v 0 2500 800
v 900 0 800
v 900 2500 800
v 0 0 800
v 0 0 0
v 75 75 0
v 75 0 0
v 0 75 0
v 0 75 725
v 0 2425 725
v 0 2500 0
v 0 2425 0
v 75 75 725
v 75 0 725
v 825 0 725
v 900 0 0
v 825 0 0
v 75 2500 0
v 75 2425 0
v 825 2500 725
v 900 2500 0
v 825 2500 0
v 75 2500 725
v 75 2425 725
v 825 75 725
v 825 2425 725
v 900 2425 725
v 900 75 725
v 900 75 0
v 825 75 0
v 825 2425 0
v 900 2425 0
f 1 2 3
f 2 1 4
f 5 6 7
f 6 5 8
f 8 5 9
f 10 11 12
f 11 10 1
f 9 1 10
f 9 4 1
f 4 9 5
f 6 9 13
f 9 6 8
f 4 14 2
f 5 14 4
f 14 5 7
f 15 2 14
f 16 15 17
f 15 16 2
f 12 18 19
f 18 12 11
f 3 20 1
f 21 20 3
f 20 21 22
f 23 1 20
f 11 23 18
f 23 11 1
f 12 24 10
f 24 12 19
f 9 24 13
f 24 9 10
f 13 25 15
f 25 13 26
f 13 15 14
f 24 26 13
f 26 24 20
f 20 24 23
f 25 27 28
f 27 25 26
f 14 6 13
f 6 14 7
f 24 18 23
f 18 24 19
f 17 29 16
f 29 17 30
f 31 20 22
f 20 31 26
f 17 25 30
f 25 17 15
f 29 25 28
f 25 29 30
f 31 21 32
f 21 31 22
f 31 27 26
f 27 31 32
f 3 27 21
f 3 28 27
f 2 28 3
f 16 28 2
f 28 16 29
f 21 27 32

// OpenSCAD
a_h = 2500;
a_sz = 900;
a_m = 800; 
v = 25;
sz = 75;

l_v = 75; //láb vastagság. Irányadó érték. Egész számú lécből rakja össze, ezért felfele kerekít
elso_lap_teljes = true;


asztal(retegek);//, rf = [2,1.1,1.1]);
//lab();
module asztal_elemekbol(){
    translate([0,0, a_m - sz])lap();
    translate([0,0,1])lab();
    translate([a_sz-l_v,0,0])lab();
    translate([a_sz-l_v,a_h-l_v,0])lab();
    translate([0,a_h-l_v,0])lab();
}

module lab(){
    l_m = a_m;
    n = ceil(l_v/v);
    
    for(l = [0:2:n-1]){
        translate([l*v,0,0])cube([v-1,sz, l_m]);
    }
    
    for(l = [1:2:n-1]){
        translate([l*v,0,0])cube([v-1,sz, l_m-sz]);
    }
}

module lap(){
    n = ceil(a_sz/v);
    
    for(l = [0:n-1]){
        translate([l*v,0,0])cube([v-1, a_h, sz]);
    }
}

c1_r = 230/255;
c1_g = 173/255;
c1_b = 87/255;
c2 = [c1_r, c1_g, c1_b];

c2_r = 233/255;
c2_g = 225/255;
c2_b = 212/255;

c1 = [c2_r, c2_g, c2_b];

retegek = [[a_m, 25, 0, c2],
           [a_m - sz, 25, 25, c2],
           [a_m, 25, 50, c2],
           [0, 25, 75, c1],
           [0, 25, 100, c1],
           [0, 25, 125, c1],
           [0, 25, 150, c1],
           [0, 25, 175, c1],
           [0, 25, 200, c1],
           [0, 25, 225, c1],
           [0, 25, 250, c1],
           [0, 25, 275, c1],
           [0, 25, 300, c1],
           [0, 25, 325, c1],
           [0, 25, 350, c1],
           [0, 25, 375, c2],
           [0, 25, 400, c2],
           [0, 25, 425, c2],
           [0, 25, 450, c2],
           [0, 25, 475, c2],
           [0, 25, 500, c2],
           [0, 25, 525, c1],
           [0, 25, 550, c1],
           [0, 25, 575, c1],
           [0, 25, 600, c1],
           [0, 25, 625, c1],
           [0, 25, 650, c1],
           [0, 25, 675, c1],
           [0, 25, 700, c1],
           [0, 25, 725, c1],
           [0, 25, 750, c1],
           [0, 25, 775, c1],
           [0, 25, 800, c1],
           [a_m, 25, 825, c2],
           [a_m - sz, 25, 850, c2],
           [a_m, 25, 875, c2 ]];


module asztal(retegek, rf = [1,1,1]){
    m = elso_lap_teljes ? [a_m, a_m - sz] : [a_m - sz, a_m];
    n = ceil(l_v/v);
    x = 0;
    rfx=rf[0];
    rfy=rf[1];
    rfz=rf[2];
    for( r = retegek){
        echo(r);
        color(r[3])translate([rfx * r[2], 0, 0])if (r[0]> 0){
            cube([r[1], sz, r[0]]);
            translate([0, rfy * (a_h - sz), 0])cube([r[1], sz, r[0]]);
            t = r[0] == a_m ? [sz, a_h - 2 * sz] : [0, a_h];
            translate([0, rfy * t[0],rfz * (a_m - sz)])cube([r[1], t[1], sz]);
        } else {
            translate([0, 0, rfz * (a_m - sz)])cube([r[1], a_h, sz]);
        }
        echo(m);
        m = m == a_m ? a_m - sz : a_m;
        echo(x);
    }
}
